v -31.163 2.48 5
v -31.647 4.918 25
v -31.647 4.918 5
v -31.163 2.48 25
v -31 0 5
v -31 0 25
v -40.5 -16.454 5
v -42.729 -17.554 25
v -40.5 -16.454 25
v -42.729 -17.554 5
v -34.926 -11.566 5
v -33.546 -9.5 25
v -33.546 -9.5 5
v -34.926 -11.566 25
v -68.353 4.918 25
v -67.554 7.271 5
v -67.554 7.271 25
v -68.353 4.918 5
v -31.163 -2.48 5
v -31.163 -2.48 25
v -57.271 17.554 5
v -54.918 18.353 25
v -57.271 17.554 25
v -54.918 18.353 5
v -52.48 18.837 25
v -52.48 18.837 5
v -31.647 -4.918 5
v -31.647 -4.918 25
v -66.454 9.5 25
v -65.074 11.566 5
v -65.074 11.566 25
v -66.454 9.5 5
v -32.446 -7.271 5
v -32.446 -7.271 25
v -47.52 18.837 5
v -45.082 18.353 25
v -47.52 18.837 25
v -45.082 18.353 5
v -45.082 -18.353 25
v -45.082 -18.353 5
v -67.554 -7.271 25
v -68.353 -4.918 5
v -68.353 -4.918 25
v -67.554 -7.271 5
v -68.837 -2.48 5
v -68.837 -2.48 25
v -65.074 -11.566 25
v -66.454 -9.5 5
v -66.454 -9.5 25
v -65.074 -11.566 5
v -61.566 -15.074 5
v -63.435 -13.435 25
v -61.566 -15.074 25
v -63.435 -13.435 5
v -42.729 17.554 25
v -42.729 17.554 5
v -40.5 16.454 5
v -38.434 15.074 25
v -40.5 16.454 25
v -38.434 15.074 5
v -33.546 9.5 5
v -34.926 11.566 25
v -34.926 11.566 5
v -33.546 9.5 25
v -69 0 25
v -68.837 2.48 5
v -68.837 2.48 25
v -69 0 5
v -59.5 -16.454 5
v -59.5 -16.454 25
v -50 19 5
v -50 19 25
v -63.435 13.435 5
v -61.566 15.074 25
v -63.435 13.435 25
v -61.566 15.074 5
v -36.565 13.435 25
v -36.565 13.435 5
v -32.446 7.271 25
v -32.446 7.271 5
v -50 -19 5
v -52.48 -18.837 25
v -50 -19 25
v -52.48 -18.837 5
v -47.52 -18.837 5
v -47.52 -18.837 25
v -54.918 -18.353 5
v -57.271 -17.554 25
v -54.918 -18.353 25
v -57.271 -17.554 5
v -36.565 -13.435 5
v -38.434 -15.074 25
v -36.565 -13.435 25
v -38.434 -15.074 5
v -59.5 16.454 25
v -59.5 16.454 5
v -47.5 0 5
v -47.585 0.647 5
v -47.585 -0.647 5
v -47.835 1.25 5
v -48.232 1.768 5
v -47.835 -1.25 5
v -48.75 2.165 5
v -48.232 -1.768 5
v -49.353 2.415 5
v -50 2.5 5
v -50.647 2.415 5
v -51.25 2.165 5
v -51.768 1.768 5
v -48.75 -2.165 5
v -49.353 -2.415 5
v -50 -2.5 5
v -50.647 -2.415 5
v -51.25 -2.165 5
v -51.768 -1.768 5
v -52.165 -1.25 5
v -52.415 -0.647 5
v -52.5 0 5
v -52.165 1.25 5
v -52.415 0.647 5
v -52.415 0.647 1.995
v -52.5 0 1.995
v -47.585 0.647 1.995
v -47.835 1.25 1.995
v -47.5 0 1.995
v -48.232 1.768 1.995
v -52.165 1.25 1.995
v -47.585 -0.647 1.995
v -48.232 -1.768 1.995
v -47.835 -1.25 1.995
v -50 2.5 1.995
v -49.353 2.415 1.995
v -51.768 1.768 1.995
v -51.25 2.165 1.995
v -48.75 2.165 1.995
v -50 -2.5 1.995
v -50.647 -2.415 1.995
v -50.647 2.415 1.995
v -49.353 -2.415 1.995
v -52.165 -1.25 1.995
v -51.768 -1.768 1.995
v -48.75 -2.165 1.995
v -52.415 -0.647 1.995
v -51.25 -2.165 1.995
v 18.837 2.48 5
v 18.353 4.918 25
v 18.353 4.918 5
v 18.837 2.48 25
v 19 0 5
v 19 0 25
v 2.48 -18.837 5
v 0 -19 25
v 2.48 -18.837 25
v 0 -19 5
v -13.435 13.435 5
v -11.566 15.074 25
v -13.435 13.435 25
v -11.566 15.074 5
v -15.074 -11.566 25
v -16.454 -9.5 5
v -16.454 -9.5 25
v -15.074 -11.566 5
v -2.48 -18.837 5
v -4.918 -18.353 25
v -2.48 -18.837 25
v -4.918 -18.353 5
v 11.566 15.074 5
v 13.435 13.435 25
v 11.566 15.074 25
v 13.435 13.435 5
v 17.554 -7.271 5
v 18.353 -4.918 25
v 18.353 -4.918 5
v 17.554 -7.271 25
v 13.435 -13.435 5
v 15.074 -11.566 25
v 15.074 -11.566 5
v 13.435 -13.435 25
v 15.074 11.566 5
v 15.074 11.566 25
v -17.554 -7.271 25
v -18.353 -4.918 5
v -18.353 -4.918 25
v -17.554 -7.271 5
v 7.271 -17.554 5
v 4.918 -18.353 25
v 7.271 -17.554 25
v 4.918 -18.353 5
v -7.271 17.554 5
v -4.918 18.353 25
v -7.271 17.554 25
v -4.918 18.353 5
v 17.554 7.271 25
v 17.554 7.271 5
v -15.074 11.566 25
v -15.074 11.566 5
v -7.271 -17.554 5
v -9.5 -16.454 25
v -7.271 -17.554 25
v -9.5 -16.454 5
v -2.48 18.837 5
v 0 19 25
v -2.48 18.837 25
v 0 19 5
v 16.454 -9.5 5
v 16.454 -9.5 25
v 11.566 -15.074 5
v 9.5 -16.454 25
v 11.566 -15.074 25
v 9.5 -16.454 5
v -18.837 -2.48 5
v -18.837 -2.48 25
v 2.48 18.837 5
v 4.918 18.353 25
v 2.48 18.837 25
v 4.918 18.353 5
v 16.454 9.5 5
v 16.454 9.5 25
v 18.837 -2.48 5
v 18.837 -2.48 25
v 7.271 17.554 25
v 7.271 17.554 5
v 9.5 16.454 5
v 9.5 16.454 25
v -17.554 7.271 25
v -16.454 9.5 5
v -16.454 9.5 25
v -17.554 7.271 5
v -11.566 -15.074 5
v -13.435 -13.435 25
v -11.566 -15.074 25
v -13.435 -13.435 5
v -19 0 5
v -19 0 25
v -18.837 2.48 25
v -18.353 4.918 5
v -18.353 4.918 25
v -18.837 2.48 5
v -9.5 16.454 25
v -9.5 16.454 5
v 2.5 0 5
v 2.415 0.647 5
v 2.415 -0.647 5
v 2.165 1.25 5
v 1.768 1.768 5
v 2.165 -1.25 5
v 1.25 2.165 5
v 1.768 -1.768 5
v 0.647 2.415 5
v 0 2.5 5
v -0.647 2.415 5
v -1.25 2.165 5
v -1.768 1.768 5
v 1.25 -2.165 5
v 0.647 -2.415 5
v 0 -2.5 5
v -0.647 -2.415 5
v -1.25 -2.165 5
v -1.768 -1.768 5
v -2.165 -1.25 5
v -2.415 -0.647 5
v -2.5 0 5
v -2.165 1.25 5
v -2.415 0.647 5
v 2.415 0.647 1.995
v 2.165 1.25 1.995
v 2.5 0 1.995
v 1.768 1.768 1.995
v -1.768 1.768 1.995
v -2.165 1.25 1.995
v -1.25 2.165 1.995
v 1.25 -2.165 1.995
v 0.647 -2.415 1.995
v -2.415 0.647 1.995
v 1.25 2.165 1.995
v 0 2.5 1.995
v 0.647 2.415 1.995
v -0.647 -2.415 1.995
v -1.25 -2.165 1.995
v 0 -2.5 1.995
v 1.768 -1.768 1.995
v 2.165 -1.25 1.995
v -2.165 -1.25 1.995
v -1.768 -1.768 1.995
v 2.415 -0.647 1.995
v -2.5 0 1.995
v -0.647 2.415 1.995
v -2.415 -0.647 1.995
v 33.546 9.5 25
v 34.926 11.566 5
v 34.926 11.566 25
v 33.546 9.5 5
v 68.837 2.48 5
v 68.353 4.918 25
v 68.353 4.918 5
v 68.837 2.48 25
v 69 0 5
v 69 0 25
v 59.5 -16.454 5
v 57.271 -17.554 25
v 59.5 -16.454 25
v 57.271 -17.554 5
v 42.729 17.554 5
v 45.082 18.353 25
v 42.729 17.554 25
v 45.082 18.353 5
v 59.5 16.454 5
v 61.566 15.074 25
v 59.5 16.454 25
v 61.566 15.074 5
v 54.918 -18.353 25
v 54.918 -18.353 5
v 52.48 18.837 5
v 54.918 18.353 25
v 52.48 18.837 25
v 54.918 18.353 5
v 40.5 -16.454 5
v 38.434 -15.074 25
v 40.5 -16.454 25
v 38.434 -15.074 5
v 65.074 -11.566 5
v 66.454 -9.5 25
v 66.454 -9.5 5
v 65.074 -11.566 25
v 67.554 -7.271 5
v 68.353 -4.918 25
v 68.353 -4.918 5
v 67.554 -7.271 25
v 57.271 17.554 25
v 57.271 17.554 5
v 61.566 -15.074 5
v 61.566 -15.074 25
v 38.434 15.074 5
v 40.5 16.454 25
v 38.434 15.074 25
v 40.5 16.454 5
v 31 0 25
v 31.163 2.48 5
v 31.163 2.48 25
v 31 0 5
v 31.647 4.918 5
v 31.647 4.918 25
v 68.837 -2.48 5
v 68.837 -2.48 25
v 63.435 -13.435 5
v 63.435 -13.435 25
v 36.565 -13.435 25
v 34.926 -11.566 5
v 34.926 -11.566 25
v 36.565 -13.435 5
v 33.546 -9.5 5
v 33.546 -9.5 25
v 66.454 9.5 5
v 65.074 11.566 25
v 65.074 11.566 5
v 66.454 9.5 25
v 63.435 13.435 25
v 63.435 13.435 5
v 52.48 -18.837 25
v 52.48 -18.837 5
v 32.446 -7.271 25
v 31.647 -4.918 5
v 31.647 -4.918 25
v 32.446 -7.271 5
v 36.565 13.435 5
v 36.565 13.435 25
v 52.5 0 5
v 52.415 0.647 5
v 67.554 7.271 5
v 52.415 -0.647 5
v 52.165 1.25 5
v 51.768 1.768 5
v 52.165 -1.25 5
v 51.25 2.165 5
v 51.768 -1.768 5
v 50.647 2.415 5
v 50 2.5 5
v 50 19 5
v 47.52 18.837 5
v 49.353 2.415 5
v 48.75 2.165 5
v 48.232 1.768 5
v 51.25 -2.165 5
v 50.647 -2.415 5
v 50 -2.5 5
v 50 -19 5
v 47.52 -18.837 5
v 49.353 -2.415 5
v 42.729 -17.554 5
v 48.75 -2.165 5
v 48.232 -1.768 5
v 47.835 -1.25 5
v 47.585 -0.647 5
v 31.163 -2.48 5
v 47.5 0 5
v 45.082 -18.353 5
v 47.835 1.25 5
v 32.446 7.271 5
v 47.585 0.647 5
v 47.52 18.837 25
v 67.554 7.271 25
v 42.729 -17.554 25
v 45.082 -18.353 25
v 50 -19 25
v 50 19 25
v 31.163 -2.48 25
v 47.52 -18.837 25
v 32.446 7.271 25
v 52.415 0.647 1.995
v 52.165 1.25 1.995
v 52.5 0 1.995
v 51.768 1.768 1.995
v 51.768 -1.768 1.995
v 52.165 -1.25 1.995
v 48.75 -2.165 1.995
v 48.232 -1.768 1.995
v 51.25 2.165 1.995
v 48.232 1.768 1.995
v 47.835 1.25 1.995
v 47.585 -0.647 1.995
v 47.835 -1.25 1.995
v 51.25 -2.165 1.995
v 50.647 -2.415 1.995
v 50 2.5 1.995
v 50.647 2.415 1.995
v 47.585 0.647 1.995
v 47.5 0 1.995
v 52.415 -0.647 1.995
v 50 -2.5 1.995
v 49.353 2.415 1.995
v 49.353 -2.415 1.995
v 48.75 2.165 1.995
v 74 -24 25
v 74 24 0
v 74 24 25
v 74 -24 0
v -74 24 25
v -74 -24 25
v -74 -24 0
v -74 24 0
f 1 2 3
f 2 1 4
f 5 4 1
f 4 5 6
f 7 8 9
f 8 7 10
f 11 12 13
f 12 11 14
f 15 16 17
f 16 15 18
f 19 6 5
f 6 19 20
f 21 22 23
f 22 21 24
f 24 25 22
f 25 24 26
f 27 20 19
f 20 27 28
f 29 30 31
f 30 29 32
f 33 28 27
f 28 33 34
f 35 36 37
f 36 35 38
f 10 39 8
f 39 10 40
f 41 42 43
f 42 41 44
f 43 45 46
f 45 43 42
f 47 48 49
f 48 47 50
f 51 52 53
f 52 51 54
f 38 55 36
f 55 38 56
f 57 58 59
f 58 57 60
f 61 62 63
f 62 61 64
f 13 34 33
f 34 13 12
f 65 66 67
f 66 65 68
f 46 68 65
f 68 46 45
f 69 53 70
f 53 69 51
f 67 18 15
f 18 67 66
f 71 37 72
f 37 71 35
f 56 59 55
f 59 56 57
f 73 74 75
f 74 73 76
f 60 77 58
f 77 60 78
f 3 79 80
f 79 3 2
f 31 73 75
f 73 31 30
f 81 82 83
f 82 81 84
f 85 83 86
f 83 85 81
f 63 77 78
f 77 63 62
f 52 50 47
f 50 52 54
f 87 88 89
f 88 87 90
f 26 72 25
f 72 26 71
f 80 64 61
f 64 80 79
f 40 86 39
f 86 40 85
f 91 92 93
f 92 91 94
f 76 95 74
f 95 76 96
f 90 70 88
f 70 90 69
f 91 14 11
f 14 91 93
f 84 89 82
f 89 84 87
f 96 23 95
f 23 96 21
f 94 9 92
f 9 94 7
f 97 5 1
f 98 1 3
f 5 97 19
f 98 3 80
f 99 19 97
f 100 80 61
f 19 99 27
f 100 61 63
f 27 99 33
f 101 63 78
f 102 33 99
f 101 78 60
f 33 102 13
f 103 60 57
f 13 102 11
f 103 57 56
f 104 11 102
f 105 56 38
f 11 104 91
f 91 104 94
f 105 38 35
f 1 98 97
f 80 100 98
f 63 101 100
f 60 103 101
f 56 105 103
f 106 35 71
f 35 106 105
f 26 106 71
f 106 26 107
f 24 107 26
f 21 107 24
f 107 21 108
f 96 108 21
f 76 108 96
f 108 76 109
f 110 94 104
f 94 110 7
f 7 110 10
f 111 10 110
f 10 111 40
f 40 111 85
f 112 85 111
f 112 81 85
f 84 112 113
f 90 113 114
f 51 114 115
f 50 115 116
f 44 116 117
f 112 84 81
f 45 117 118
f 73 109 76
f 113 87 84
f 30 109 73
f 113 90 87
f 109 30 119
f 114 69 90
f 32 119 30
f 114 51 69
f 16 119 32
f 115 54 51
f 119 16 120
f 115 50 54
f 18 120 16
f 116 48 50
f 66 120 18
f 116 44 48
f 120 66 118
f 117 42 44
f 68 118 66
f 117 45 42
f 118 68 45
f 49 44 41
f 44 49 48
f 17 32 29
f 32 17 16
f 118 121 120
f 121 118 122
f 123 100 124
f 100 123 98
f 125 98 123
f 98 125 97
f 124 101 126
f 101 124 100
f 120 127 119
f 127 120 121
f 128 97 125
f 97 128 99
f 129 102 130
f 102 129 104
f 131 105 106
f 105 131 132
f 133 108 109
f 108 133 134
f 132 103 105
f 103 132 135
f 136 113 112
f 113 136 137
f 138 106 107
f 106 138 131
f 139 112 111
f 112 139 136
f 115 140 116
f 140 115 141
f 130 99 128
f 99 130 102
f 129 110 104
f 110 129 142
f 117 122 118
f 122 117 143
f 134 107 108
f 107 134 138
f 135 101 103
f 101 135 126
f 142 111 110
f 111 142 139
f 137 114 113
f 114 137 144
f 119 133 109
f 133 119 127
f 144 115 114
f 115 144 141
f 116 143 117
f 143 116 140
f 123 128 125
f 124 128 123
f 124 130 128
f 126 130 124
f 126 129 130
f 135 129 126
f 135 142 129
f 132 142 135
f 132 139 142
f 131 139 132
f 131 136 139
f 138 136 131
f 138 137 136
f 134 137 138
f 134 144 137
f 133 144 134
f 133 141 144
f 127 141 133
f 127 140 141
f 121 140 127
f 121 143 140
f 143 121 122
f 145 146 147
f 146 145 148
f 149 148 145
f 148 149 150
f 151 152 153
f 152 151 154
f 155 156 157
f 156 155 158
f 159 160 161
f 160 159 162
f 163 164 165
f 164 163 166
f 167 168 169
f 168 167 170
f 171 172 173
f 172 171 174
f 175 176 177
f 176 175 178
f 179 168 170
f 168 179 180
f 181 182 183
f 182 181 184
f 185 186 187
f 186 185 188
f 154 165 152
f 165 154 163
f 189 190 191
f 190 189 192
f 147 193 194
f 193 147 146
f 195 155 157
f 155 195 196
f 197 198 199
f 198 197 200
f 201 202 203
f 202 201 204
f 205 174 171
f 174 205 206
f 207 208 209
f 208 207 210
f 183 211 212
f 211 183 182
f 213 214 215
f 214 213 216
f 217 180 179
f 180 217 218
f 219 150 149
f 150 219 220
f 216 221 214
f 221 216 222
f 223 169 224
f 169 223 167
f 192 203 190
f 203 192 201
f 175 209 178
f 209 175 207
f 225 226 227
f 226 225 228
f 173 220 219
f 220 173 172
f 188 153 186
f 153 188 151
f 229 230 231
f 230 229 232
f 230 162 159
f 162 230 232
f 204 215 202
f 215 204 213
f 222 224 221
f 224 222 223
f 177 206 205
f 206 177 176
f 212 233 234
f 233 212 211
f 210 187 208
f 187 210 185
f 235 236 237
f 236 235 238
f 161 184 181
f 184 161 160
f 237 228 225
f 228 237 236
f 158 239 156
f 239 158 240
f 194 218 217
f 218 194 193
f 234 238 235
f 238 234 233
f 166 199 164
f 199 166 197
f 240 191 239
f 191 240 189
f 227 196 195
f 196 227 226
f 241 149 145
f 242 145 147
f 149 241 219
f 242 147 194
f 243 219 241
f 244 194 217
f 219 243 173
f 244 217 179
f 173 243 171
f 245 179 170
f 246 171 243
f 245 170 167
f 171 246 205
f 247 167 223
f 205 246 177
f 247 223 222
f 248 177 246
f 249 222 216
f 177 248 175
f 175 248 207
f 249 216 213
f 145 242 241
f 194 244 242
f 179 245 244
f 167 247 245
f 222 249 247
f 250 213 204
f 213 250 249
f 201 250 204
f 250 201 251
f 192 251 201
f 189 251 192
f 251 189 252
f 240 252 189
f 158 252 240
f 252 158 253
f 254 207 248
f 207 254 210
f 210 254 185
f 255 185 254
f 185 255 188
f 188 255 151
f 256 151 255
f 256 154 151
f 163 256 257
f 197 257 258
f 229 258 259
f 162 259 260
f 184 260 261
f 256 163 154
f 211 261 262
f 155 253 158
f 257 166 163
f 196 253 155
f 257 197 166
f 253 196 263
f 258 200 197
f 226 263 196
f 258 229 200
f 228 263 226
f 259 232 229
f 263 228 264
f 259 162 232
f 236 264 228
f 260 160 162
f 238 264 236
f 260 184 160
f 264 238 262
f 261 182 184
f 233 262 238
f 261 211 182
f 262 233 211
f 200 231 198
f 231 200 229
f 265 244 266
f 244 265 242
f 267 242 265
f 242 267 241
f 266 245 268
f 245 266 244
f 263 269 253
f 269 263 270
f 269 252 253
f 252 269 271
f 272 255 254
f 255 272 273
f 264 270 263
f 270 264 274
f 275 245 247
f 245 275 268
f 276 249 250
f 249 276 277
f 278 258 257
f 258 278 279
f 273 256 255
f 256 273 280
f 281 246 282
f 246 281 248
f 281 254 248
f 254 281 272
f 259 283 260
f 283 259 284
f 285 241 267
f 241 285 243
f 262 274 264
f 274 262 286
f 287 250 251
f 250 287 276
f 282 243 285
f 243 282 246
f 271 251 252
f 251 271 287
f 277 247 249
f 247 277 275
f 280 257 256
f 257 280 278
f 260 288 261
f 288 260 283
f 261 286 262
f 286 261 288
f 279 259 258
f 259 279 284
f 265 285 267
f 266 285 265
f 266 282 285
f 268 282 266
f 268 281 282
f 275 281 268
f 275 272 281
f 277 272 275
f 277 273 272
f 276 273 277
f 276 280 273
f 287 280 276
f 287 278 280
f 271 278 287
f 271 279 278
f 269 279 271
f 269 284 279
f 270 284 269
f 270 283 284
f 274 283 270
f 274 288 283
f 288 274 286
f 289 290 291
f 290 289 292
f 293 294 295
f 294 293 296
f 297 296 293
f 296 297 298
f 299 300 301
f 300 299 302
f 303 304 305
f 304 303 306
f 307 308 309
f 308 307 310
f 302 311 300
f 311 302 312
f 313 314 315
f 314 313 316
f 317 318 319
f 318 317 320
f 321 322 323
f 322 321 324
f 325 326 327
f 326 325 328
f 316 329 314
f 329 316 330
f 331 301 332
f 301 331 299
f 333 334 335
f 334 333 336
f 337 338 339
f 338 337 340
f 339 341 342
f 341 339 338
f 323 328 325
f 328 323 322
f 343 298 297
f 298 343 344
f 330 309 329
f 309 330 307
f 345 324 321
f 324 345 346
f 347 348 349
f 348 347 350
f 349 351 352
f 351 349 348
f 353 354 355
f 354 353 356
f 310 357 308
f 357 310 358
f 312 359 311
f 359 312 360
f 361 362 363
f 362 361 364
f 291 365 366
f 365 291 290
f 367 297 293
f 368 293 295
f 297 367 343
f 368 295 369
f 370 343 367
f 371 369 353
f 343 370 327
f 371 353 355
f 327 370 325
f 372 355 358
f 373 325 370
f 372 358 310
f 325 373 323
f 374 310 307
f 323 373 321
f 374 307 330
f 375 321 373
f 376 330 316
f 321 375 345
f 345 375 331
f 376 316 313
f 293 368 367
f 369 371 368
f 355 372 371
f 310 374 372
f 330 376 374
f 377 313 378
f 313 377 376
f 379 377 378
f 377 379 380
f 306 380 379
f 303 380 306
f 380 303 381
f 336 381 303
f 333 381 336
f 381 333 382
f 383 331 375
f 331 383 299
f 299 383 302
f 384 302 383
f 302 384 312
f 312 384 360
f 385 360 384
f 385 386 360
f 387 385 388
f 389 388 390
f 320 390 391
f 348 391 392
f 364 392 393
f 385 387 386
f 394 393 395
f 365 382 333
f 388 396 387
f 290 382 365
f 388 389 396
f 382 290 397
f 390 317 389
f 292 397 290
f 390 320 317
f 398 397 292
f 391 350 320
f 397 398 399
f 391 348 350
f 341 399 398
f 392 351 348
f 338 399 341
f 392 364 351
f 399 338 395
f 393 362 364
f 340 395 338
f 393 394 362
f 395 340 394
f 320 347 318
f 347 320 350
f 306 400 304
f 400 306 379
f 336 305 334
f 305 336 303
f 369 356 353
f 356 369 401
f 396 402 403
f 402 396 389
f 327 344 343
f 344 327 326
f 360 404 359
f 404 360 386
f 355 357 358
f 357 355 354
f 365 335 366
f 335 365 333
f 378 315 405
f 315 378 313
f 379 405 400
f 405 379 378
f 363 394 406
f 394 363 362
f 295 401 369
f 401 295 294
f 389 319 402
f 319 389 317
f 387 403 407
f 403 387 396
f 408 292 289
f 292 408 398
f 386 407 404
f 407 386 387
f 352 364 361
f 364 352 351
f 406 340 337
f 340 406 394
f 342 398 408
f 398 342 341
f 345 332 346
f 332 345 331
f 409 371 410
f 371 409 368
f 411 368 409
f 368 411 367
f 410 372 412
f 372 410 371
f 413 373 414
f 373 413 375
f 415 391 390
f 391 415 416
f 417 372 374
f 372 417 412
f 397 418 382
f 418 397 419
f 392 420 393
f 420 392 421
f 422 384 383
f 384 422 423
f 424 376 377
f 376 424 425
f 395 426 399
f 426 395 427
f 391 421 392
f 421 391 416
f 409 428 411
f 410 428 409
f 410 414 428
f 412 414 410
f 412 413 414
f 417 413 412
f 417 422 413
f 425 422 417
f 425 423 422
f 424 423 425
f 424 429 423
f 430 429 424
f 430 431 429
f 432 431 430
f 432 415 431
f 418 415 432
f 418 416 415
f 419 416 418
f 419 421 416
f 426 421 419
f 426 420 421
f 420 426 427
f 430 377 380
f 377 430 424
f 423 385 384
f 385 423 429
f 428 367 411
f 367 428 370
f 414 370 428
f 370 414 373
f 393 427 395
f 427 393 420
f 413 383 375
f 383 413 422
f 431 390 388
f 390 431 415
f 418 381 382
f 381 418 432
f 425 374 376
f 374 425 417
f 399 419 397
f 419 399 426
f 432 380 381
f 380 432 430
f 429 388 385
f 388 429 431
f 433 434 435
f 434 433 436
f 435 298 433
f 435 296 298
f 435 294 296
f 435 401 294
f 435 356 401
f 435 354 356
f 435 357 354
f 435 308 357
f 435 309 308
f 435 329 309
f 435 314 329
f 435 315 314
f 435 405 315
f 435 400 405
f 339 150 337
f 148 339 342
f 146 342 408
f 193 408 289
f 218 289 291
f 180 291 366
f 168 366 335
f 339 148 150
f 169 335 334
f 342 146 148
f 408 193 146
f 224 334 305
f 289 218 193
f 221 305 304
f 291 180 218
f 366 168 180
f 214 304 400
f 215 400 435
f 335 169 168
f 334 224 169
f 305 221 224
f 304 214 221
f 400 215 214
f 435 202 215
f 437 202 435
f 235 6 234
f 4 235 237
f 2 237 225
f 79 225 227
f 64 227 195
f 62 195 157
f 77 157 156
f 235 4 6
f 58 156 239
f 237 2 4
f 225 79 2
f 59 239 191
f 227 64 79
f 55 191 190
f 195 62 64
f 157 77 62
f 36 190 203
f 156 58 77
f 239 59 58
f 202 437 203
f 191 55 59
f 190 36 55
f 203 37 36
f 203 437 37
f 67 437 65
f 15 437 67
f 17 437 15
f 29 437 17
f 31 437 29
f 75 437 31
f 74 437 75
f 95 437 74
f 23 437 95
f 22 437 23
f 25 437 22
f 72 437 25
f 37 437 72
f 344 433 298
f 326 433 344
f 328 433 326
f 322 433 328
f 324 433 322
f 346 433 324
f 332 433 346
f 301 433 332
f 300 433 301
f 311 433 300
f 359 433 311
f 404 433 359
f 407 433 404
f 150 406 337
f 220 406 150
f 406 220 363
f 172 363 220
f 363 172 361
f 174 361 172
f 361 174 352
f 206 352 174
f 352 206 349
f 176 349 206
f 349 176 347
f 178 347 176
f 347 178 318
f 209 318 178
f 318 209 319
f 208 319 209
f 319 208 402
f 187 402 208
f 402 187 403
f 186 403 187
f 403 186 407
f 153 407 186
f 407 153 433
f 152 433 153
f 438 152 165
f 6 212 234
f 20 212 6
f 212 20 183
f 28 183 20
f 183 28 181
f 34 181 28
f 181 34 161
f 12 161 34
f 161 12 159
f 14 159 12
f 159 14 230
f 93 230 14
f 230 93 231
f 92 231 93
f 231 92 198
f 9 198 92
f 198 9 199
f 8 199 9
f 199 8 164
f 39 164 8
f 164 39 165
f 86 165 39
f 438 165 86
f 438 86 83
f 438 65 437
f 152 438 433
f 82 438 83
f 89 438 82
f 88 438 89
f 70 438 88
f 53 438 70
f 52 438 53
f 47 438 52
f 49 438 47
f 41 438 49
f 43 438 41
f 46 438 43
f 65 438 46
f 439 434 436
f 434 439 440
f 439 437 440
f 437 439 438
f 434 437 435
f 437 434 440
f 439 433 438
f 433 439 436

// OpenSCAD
// Tool dock — 3-station magnetic parking rack
// Port of hardware/cad/tool_dock.py (Berkeley passive tool changer design)
// Regenerate: openscad -o hardware/stl/tool_dock_3station.stl hardware/scad/tool_dock.scad

// Parameters (mm)
SLOT_DIAMETER   = 38.0;
SLOT_DEPTH      = 20.0;
SLOT_SPACING    = 50.0;  // center-to-center
NUM_SLOTS       = 3;
BASE_THICKNESS  = 5.0;
MAGNET_DIAMETER = 5.0;
MAGNET_DEPTH    = 3.0;

// Derived
DOCK_LENGTH = SLOT_SPACING * (NUM_SLOTS - 1) + SLOT_DIAMETER + 10;  // 148
DOCK_WIDTH  = SLOT_DIAMETER + 10;                                     // 48
TOTAL_H     = BASE_THICKNESS + SLOT_DEPTH;

difference() {
    // Solid base block
    translate([0, 0, TOTAL_H / 2])
        cube([DOCK_LENGTH, DOCK_WIDTH, TOTAL_H], center = true);

    // Cut cylindrical slots
    for (i = [0 : NUM_SLOTS - 1]) {
        x_pos = (i - 1) * SLOT_SPACING;
        // Slot pocket (cut from top)
        translate([x_pos, 0, BASE_THICKNESS + SLOT_DEPTH / 2 + 0.01])
            cylinder(h = SLOT_DEPTH + 0.02, d = SLOT_DIAMETER, center = true, $fn = 48);
        // Magnet pocket (at bottom of slot)
        translate([x_pos, 0, BASE_THICKNESS - MAGNET_DEPTH / 2])
            cylinder(h = MAGNET_DEPTH + 0.01, d = MAGNET_DIAMETER, center = true, $fn = 24);
    }
}
